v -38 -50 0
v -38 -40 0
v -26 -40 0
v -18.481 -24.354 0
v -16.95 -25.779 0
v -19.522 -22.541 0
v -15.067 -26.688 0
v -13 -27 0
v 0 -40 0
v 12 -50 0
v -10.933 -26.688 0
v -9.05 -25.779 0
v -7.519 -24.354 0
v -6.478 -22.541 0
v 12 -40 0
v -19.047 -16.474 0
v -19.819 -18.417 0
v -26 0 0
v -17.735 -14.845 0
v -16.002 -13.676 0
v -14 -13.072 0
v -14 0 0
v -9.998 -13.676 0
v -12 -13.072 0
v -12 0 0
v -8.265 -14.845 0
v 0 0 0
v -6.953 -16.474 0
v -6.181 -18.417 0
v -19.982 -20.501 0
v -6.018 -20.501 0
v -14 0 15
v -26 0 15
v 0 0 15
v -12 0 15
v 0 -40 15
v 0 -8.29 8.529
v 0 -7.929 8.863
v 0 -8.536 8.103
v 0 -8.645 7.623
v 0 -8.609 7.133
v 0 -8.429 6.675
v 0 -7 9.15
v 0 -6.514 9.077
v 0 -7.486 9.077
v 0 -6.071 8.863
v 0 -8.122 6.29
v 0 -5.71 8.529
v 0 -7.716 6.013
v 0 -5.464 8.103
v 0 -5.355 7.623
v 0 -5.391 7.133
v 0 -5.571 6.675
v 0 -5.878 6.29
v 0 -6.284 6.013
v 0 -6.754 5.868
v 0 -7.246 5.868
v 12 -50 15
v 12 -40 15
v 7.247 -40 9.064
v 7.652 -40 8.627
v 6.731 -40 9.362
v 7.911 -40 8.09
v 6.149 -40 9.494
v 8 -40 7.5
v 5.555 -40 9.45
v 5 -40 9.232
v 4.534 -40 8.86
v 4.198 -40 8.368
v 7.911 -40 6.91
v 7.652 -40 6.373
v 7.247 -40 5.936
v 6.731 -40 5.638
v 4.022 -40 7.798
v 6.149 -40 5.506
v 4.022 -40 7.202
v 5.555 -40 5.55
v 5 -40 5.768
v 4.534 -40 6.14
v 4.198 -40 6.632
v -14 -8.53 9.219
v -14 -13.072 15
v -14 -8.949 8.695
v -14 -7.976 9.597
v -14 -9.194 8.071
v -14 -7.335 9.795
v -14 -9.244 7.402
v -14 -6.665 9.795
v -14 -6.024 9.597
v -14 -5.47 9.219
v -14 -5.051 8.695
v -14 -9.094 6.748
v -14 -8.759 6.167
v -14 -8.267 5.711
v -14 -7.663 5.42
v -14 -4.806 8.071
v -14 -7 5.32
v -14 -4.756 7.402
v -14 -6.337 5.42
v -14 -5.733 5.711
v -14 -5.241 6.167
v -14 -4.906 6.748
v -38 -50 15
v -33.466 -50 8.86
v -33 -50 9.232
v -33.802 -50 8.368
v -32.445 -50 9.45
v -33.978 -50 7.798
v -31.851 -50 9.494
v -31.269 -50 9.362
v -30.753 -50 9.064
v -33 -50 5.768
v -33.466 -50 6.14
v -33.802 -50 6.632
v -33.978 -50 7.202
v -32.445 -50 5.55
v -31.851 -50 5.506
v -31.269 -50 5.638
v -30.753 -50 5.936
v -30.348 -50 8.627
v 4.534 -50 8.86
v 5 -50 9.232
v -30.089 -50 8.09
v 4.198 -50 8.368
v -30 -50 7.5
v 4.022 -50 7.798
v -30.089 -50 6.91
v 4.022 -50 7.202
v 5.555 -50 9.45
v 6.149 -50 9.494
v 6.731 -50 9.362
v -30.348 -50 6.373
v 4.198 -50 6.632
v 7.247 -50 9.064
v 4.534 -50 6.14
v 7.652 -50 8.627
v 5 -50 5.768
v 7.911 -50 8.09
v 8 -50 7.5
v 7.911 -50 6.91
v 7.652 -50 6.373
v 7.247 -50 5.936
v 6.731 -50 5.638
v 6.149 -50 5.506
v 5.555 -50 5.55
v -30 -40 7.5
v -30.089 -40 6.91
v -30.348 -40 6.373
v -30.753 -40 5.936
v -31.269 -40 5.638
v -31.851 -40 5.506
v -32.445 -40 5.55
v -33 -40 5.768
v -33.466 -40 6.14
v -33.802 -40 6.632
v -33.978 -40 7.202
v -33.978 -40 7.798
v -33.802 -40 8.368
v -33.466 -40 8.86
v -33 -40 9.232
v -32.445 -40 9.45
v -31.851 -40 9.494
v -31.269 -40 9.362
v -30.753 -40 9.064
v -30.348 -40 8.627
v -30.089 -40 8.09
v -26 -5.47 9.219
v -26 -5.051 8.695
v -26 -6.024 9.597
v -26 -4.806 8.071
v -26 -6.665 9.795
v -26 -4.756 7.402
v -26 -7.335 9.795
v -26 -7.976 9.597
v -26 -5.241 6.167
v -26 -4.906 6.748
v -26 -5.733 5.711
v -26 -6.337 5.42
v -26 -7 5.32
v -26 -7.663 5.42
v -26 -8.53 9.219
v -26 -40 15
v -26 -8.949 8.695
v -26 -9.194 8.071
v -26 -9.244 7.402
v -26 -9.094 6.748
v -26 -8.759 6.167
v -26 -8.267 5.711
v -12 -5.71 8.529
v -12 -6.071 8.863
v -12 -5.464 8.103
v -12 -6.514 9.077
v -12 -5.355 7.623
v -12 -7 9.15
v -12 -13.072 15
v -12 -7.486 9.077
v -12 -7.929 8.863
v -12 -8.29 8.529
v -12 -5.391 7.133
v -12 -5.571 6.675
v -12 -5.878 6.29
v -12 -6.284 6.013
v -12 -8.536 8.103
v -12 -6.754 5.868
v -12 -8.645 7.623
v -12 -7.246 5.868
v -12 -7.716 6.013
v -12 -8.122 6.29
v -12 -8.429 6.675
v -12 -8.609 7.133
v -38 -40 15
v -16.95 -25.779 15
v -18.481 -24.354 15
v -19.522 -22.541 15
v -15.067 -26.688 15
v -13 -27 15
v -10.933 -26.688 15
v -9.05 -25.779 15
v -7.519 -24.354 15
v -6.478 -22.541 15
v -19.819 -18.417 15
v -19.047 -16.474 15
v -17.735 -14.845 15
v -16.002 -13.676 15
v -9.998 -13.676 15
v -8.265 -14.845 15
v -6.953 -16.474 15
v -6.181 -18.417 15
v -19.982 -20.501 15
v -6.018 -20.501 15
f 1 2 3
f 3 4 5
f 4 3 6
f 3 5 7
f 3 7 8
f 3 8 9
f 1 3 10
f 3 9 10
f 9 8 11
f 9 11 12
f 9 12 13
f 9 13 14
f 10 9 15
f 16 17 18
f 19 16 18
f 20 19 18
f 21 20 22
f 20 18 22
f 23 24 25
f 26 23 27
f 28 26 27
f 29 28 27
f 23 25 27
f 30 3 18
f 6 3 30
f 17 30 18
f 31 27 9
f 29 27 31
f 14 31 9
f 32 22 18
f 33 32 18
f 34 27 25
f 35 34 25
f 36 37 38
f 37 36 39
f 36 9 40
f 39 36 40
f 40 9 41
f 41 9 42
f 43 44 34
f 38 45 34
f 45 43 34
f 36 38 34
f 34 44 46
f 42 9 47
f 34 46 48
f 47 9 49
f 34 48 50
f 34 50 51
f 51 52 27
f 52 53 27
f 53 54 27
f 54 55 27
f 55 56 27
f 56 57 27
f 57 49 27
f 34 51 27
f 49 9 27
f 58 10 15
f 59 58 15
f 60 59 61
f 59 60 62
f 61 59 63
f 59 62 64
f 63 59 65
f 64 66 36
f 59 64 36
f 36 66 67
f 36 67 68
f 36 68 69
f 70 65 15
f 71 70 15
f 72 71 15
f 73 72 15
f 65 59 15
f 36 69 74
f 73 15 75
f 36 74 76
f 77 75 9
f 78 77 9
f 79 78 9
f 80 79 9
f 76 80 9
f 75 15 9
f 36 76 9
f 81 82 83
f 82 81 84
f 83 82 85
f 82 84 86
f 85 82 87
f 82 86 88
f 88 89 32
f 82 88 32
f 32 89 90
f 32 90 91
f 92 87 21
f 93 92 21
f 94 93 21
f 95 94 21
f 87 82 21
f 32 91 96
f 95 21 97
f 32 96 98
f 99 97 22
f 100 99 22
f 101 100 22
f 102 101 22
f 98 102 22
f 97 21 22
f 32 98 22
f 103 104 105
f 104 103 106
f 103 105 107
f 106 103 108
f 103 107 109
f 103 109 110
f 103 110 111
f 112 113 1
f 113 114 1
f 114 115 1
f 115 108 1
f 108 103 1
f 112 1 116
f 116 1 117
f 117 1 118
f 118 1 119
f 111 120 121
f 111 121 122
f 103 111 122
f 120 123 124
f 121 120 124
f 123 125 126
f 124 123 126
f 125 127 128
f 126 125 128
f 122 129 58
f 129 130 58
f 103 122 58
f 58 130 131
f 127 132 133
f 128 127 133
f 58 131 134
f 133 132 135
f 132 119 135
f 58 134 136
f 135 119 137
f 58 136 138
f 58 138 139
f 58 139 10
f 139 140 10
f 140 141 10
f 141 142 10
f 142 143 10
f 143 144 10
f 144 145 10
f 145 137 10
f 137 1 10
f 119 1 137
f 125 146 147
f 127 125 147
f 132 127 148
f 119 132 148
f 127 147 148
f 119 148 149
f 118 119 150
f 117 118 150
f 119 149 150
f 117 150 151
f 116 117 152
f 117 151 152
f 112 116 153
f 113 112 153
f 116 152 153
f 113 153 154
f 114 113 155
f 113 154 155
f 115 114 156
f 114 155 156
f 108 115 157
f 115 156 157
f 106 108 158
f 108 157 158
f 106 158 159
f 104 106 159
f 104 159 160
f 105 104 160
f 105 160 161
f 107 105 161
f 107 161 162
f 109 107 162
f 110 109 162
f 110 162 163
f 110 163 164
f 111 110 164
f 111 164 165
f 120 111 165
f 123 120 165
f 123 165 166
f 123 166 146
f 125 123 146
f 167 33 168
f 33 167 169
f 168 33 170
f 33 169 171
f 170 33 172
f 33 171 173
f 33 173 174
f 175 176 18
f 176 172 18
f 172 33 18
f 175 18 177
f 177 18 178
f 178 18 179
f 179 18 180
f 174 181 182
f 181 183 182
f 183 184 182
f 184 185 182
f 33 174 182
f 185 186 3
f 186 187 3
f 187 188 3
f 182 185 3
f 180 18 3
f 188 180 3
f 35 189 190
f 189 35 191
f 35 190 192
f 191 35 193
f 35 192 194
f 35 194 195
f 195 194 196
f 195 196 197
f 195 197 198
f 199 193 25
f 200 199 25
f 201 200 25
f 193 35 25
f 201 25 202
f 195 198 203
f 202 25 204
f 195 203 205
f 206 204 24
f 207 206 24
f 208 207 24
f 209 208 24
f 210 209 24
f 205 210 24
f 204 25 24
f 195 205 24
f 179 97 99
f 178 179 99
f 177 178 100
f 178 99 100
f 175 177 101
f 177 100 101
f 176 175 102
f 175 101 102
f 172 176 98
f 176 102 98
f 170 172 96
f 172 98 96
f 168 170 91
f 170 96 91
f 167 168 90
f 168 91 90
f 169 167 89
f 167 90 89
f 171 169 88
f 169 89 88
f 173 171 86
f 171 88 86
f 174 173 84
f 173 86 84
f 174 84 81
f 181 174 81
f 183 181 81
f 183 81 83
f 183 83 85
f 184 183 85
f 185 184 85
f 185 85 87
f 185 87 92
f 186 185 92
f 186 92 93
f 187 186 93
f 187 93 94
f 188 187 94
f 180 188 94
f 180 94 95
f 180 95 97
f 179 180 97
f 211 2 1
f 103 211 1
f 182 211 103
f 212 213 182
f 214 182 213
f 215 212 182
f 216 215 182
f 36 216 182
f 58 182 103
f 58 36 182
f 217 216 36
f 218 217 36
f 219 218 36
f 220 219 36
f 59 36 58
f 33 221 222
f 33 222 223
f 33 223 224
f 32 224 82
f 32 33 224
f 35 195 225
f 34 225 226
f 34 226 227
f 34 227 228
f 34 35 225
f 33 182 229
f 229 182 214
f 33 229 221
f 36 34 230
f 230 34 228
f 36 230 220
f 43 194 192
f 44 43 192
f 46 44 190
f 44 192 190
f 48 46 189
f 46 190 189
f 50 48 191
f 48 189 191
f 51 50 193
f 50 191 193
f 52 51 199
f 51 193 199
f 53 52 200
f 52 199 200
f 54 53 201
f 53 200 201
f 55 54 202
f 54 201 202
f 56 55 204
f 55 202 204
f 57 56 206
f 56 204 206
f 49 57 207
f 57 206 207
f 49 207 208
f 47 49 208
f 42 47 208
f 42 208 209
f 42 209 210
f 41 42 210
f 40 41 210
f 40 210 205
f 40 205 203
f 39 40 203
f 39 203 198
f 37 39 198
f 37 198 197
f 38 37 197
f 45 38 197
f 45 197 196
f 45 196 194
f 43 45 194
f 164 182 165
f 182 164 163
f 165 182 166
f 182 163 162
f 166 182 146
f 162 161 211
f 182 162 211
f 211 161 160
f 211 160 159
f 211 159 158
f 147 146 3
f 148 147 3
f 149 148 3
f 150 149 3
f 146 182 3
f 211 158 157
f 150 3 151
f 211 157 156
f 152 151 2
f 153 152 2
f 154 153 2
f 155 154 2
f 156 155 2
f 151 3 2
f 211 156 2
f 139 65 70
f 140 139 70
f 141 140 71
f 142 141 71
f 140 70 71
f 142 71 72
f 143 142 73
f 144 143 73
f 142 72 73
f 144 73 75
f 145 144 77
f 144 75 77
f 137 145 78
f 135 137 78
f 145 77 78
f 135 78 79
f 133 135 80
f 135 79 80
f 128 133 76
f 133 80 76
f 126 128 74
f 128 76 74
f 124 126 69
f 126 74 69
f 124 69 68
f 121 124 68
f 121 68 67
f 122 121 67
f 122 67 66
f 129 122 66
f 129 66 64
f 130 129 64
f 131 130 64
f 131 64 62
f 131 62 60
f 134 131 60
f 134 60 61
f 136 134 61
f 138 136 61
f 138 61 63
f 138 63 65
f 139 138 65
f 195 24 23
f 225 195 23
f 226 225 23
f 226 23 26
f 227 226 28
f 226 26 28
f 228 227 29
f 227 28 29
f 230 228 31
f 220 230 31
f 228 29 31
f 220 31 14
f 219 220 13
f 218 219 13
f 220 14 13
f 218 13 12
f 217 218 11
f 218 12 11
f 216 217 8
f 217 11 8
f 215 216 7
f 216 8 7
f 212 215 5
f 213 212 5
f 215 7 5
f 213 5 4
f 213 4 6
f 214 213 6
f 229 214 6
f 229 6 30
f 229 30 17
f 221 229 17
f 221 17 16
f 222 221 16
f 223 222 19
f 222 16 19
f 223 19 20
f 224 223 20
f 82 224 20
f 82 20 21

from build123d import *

# Parameters (mm, degrees)
BOSS_EXTRUDE1_DEPTH   = 15
SKETCH5_R             = 2
CUT_EXTRUDE3_DEPTH    = 15
D_GAGEMENT_M41_D      = 4.5
D_GAGEMENT_M41_DEPTH  = 12
TROU_TARAUD_M41_D     = 3.3
TROU_TARAUD_M41_DEPTH = 12


with BuildPart() as part:
    # Sketch1 → Boss-Extrude1 (new body)
    with BuildSketch(Plane.XY):
        with BuildLine():
            Line((-26, 0), (-26, -40))
            Line((-26, -40), (-38, -40))
            Line((-38, -40), (-38, -50))
            Line((-38, -50), (12, -50))
            Line((12, -50), (12, -40))
            Line((12, -40), (0, -40))
            Line((0, -40), (0, 0))
            Line((0, 0), (-12, 0))
            Line((-12, 0), (-12, -13.07179677))
            ThreePointArc((-12, -13.07179677), (-13, -27), (-14, -13.07179677))
            Line((-14, -13.07179677), (-14, 0))
            Line((-14, 0), (-26, 0))
        make_face()
    extrude(amount=BOSS_EXTRUDE1_DEPTH)

    # Sketch5 → Cut-Extrude3 (cut)
    with BuildSketch(Plane(origin=(0, -40, 0), x_dir=(1, 0, 0), z_dir=(0, 1, 0))):
        with Locations((6, -7.5)):
            Circle(SKETCH5_R)
        with Locations((-32, -7.5)):
            Circle(SKETCH5_R)
    extrude(amount=-CUT_EXTRUDE3_DEPTH, mode=Mode.SUBTRACT)

    # Dégagement M41
    with Locations(Plane.ZY.offset(26)):
        with Locations((7.569852971, -7)):
            Hole(D_GAGEMENT_M41_D / 2, depth=D_GAGEMENT_M41_DEPTH)

    # Trou taraudé M41
    with Locations(Plane(origin=(0, 0, 0), x_dir=(0, 0, -1), z_dir=(1, 0, 0))):
        with Locations((-7.5, -7)):
            Hole(TROU_TARAUD_M41_D / 2, depth=TROU_TARAUD_M41_DEPTH)


solid = part.part
